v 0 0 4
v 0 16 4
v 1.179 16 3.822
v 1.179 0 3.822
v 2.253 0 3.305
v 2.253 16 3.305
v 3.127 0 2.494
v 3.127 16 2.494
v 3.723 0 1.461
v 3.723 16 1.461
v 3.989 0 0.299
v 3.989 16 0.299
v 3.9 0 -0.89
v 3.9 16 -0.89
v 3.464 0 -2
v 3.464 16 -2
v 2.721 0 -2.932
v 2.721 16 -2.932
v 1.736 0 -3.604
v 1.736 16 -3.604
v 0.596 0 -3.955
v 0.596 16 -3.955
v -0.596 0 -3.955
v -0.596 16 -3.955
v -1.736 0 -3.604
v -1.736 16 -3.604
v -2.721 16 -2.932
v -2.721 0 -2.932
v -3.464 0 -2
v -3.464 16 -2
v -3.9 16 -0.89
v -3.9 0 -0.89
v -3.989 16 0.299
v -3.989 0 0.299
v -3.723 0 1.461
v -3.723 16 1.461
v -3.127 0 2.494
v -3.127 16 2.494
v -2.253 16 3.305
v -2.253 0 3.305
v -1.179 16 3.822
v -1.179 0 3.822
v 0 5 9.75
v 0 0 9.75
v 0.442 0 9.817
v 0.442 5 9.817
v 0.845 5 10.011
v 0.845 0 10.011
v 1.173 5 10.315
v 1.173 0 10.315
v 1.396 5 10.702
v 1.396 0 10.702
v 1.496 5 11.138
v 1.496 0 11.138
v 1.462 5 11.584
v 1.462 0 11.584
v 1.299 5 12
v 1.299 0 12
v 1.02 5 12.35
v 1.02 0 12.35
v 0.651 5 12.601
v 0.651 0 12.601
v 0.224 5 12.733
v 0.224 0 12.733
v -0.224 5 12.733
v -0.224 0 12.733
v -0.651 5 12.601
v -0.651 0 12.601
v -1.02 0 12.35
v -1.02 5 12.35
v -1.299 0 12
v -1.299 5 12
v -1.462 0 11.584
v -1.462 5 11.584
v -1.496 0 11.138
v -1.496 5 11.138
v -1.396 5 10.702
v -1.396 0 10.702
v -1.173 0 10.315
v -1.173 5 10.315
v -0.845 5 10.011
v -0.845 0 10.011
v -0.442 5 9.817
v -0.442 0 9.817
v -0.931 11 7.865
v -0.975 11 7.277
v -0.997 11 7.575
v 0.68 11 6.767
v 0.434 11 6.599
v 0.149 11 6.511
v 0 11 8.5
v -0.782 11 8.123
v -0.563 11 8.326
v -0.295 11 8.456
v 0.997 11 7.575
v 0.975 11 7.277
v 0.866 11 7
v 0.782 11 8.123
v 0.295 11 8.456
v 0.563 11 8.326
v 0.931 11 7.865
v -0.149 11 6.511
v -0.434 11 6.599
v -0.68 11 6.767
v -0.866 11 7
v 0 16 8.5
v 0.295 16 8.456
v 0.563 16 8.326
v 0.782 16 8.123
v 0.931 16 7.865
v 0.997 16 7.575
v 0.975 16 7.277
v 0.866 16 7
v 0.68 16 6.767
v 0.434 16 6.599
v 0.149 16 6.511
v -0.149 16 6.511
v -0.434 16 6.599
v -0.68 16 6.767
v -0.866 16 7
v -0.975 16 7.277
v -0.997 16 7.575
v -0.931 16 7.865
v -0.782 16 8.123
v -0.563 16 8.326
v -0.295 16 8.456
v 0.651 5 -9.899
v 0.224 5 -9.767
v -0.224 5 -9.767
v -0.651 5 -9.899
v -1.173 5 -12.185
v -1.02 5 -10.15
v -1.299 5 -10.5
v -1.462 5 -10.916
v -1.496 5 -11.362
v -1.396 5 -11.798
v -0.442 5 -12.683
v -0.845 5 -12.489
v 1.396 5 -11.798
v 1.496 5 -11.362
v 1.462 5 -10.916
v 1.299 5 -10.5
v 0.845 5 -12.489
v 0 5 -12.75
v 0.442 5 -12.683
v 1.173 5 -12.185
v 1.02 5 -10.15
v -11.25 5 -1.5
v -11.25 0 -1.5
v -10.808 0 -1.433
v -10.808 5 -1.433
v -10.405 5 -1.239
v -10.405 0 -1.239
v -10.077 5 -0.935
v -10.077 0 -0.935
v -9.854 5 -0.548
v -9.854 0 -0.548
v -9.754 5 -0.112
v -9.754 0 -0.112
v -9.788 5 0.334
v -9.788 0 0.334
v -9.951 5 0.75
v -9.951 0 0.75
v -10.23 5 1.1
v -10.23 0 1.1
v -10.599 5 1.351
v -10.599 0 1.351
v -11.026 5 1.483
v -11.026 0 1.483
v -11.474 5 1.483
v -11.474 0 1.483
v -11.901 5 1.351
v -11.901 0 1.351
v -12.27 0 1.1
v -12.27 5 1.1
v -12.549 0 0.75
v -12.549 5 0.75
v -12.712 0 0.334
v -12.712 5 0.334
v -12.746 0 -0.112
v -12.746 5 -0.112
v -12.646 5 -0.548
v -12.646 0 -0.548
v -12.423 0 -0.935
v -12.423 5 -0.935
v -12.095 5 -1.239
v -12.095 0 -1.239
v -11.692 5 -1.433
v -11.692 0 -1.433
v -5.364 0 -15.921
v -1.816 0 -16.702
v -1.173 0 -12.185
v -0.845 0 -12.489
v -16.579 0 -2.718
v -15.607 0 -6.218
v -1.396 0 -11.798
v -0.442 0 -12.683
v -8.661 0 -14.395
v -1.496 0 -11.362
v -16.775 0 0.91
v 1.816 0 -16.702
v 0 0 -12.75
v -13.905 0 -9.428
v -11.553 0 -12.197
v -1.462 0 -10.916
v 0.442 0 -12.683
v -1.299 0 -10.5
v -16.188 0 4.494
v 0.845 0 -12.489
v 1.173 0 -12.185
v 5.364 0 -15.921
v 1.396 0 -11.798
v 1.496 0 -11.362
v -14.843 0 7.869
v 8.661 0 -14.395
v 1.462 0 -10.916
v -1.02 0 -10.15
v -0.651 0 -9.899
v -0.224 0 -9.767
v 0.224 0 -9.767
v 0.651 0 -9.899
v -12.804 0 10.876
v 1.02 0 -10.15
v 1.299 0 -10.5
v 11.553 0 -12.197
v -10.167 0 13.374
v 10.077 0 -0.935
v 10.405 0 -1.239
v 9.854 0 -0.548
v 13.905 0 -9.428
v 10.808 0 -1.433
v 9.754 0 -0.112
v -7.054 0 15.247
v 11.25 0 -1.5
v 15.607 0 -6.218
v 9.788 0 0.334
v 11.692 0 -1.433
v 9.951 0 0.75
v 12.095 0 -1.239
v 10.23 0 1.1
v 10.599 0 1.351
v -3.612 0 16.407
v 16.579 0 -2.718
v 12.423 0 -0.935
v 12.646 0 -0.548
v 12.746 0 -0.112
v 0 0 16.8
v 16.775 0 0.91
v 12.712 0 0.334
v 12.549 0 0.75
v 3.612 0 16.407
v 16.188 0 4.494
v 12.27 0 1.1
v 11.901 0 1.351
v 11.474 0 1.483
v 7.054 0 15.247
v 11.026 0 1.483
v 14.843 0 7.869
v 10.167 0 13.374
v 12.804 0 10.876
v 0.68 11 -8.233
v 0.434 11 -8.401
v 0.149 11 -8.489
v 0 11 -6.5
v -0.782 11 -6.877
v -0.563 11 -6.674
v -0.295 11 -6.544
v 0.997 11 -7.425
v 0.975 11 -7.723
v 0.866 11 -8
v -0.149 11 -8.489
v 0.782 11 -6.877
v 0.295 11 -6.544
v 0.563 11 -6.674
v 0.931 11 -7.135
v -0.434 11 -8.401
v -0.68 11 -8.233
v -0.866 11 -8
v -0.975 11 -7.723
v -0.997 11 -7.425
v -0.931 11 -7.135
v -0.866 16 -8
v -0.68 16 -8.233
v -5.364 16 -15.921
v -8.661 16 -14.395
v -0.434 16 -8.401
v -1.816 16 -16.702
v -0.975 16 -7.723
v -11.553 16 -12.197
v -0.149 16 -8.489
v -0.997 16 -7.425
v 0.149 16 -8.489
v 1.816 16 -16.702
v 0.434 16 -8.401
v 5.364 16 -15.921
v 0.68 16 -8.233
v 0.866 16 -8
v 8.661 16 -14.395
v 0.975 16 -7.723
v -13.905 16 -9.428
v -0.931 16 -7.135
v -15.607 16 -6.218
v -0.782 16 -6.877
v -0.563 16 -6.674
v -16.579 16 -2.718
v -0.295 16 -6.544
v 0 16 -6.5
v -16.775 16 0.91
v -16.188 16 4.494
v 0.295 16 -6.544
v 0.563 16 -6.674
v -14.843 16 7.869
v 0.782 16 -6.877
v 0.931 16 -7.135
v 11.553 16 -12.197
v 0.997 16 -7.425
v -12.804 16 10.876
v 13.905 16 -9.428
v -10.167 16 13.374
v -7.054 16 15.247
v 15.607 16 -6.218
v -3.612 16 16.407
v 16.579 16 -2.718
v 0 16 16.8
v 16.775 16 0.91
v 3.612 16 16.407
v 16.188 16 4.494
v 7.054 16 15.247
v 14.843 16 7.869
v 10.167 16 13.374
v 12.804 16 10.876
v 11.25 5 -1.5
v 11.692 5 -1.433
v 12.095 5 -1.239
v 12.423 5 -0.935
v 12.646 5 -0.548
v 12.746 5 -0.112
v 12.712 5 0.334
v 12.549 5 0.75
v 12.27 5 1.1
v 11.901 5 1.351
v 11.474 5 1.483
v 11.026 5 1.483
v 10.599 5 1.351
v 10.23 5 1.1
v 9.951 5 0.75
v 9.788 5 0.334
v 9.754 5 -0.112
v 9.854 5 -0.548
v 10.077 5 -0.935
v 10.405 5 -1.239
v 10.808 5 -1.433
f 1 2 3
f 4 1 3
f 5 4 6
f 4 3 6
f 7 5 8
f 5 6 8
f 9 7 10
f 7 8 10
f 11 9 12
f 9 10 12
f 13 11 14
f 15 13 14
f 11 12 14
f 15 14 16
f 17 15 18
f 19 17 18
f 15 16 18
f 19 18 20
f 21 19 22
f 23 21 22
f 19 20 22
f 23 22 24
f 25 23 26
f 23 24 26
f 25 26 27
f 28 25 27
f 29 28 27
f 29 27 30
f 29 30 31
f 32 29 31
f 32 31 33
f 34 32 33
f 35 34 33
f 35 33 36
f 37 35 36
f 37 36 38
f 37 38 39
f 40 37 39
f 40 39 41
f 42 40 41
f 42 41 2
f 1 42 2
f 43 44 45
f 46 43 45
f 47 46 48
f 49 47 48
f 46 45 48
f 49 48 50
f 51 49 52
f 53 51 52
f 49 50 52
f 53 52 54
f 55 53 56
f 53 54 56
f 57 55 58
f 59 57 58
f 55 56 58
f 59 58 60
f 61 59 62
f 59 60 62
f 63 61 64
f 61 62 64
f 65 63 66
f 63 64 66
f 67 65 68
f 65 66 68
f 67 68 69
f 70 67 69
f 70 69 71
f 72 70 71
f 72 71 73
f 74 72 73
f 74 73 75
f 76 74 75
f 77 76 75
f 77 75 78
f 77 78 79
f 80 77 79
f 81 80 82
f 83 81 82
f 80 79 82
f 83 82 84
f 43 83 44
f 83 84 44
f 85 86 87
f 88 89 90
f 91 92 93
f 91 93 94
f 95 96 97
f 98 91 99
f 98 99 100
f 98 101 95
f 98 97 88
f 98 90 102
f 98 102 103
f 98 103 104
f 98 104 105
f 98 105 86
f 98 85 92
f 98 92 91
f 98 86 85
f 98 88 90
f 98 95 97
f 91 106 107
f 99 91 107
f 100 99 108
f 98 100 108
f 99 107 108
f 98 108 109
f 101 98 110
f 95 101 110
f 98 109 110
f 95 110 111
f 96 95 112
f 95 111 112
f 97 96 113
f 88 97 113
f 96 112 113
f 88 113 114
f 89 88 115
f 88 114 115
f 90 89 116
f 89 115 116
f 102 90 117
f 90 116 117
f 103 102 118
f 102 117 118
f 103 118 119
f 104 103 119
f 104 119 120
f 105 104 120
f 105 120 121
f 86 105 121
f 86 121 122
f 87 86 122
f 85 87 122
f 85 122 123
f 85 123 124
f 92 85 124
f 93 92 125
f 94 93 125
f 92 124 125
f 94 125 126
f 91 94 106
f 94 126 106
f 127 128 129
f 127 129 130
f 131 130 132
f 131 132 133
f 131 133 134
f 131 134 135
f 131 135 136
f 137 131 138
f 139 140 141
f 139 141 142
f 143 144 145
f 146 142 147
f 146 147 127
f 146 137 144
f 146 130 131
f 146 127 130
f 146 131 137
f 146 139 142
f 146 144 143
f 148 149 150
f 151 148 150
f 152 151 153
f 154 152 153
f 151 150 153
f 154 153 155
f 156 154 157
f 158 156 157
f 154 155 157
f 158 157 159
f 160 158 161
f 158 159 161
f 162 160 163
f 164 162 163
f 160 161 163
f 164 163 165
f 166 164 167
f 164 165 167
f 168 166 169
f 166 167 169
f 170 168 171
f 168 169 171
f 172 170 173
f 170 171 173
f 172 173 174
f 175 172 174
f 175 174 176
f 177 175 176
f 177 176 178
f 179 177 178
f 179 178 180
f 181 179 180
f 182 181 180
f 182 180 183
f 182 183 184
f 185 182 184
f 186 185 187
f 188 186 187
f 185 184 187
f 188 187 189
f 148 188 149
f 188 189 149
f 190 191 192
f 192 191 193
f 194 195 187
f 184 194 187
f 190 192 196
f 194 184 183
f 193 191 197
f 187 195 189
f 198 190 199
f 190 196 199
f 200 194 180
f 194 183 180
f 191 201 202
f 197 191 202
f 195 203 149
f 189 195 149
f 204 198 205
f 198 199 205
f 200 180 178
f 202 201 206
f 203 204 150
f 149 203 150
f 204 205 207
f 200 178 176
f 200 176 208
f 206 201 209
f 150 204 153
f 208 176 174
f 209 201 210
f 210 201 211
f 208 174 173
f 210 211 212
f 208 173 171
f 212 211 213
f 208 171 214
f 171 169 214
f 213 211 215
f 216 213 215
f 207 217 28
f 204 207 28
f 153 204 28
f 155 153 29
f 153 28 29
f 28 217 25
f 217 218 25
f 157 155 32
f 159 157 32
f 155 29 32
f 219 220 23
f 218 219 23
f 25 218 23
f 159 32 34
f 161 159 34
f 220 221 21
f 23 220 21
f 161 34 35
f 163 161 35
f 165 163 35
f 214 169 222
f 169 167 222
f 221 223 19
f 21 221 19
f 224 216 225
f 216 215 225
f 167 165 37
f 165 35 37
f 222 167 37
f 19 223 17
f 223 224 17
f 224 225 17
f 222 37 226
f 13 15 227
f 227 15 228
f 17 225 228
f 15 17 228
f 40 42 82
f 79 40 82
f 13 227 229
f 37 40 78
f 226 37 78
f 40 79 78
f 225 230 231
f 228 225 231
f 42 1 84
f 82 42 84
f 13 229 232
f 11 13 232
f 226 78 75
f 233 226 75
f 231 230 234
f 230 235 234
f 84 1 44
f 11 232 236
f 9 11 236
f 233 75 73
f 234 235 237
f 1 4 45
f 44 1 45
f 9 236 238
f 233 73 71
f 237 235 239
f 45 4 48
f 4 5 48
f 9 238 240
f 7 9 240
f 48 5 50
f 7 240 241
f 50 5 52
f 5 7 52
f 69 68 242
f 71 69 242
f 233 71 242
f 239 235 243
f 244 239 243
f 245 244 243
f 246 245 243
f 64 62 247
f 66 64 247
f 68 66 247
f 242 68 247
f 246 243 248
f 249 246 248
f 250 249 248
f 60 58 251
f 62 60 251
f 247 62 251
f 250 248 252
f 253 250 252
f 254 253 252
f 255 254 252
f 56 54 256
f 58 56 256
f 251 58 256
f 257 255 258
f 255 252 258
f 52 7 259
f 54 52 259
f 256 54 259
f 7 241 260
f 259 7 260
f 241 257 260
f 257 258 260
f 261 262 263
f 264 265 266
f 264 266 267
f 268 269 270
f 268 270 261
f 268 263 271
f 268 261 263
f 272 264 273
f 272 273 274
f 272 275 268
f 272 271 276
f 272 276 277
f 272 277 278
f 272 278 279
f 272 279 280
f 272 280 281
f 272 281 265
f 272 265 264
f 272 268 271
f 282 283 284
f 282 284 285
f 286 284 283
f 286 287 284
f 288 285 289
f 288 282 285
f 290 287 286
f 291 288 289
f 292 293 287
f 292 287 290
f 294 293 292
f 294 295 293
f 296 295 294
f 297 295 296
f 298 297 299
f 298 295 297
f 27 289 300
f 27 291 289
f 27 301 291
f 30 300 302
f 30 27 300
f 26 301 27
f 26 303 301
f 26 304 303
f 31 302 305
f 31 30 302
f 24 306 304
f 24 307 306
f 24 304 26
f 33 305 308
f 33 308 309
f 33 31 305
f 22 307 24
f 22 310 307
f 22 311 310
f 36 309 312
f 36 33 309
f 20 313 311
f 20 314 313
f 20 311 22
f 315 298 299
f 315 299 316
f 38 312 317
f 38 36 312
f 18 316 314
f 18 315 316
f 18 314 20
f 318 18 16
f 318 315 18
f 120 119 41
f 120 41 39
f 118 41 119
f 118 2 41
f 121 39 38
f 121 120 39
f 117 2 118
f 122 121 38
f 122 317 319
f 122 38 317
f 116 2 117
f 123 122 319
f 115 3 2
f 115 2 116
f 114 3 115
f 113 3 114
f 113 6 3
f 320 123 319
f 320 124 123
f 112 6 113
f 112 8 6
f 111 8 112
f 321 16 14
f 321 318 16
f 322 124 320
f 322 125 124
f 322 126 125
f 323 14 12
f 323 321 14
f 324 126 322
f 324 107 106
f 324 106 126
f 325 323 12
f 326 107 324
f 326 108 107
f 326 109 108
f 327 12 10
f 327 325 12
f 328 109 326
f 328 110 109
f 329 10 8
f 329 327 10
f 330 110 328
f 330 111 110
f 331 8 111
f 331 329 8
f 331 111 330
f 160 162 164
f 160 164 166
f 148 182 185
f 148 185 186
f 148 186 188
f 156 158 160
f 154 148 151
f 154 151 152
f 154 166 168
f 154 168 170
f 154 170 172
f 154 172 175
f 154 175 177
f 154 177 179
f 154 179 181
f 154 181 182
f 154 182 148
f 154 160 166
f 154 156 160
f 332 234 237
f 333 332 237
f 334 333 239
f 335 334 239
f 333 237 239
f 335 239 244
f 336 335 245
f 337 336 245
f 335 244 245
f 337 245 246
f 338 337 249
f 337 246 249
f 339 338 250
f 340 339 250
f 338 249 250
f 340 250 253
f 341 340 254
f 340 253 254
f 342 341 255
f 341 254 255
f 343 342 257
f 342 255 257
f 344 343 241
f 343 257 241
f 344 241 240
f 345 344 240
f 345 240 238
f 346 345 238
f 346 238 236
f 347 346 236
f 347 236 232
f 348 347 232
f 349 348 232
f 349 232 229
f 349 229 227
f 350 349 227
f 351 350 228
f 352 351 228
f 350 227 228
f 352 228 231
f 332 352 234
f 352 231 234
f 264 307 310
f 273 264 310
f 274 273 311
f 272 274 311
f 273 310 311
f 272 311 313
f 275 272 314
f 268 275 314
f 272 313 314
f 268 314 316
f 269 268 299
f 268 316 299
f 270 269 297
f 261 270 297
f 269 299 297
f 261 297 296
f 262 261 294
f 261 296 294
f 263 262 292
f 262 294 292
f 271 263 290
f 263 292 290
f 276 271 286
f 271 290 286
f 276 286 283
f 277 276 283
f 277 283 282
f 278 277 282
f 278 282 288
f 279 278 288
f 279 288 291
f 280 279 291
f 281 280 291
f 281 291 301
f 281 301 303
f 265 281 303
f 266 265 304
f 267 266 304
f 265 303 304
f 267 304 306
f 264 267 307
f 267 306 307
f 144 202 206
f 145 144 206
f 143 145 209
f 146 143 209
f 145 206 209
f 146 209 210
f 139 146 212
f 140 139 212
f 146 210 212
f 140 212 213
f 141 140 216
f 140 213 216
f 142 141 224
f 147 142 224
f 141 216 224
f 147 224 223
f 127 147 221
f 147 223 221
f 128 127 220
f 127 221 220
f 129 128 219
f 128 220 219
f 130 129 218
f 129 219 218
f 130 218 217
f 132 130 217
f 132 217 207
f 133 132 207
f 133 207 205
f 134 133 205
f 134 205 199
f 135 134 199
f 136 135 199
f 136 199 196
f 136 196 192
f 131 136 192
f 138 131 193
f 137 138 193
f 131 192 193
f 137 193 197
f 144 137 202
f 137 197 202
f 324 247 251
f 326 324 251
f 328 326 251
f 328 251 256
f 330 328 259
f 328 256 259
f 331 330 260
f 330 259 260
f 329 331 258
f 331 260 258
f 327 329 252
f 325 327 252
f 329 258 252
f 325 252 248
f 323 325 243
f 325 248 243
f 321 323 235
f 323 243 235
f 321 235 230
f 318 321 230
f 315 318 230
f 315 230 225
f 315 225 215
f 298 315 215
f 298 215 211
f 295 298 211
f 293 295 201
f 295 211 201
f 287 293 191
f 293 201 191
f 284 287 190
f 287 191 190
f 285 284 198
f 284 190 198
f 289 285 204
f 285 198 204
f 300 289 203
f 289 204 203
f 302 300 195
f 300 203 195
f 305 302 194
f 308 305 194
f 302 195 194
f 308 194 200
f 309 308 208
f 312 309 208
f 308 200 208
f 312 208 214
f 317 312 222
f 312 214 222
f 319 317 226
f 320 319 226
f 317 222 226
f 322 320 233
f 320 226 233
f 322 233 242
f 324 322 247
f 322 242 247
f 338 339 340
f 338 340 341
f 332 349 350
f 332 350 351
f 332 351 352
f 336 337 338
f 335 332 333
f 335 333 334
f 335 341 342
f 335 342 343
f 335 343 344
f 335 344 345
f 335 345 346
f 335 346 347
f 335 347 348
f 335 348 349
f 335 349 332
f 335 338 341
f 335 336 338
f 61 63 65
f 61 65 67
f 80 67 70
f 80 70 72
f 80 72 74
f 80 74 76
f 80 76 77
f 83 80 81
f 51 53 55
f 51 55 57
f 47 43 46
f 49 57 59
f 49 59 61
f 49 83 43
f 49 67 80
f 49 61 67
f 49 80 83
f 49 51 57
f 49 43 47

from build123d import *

# Parameters (mm, degrees)
SKETCH1_R           = 16.8
BOSS_EXTRUDE1_DEPTH = 16
SKETCH2_R           = 4
CUT_EXTRUDE1_DEPTH  = 29.644022064
SKETCH3_R           = 1
CUT_EXTRUDE2_DEPTH  = 5
SKETCH4_R           = 1.5
CUT_EXTRUDE3_DEPTH  = 5


with BuildPart() as part:
    # Sketch1 → Boss-Extrude1 (new body)
    with BuildSketch(Plane(origin=(0, 0, 0), x_dir=(1, 0, 0), z_dir=(0, 1, 0))):
        with Locations(Location((0, 0, 0), (0, 0, 270))):
            Circle(SKETCH1_R)
    extrude(amount=BOSS_EXTRUDE1_DEPTH)

    # Sketch2 → Cut-Extrude1 (cut, through all)
    with BuildSketch(Plane(origin=(0, 16, 0), x_dir=(1, 0, 0), z_dir=(0, 1, 0))):
        with Locations(Location((0, 0, 0), (0, 0, 270))):
            Circle(SKETCH2_R)
    extrude(amount=-CUT_EXTRUDE1_DEPTH, mode=Mode.SUBTRACT)

    # Sketch3 → Cut-Extrude2 (cut)
    with BuildSketch(Plane(origin=(0, 16, 0), x_dir=(1, 0, 0), z_dir=(0, 1, 0))):
        with Locations(Location((0, 7.5, 0), (0, 0, 270))):
            Circle(SKETCH3_R)
        with Locations(Location((0, -7.5, 0), (0, 0, 270))):
            Circle(SKETCH3_R)
    extrude(amount=-CUT_EXTRUDE2_DEPTH, mode=Mode.SUBTRACT)

    # Sketch4 → Cut-Extrude3 (cut)
    with BuildSketch(Plane.XZ):
        with Locations(Location((0, 11.25, 0), (0, 0, 270))):
            Circle(SKETCH4_R)
        with Locations(Location((11.25, 0, 0), (0, 0, 270))):
            Circle(SKETCH4_R)
        with Locations(Location((0, -11.25, 0), (0, 0, 270))):
            Circle(SKETCH4_R)
        with Locations(Location((-11.25, 0, 0), (0, 0, 270))):
            Circle(SKETCH4_R)
    extrude(amount=-CUT_EXTRUDE3_DEPTH, mode=Mode.SUBTRACT)


solid = part.part
